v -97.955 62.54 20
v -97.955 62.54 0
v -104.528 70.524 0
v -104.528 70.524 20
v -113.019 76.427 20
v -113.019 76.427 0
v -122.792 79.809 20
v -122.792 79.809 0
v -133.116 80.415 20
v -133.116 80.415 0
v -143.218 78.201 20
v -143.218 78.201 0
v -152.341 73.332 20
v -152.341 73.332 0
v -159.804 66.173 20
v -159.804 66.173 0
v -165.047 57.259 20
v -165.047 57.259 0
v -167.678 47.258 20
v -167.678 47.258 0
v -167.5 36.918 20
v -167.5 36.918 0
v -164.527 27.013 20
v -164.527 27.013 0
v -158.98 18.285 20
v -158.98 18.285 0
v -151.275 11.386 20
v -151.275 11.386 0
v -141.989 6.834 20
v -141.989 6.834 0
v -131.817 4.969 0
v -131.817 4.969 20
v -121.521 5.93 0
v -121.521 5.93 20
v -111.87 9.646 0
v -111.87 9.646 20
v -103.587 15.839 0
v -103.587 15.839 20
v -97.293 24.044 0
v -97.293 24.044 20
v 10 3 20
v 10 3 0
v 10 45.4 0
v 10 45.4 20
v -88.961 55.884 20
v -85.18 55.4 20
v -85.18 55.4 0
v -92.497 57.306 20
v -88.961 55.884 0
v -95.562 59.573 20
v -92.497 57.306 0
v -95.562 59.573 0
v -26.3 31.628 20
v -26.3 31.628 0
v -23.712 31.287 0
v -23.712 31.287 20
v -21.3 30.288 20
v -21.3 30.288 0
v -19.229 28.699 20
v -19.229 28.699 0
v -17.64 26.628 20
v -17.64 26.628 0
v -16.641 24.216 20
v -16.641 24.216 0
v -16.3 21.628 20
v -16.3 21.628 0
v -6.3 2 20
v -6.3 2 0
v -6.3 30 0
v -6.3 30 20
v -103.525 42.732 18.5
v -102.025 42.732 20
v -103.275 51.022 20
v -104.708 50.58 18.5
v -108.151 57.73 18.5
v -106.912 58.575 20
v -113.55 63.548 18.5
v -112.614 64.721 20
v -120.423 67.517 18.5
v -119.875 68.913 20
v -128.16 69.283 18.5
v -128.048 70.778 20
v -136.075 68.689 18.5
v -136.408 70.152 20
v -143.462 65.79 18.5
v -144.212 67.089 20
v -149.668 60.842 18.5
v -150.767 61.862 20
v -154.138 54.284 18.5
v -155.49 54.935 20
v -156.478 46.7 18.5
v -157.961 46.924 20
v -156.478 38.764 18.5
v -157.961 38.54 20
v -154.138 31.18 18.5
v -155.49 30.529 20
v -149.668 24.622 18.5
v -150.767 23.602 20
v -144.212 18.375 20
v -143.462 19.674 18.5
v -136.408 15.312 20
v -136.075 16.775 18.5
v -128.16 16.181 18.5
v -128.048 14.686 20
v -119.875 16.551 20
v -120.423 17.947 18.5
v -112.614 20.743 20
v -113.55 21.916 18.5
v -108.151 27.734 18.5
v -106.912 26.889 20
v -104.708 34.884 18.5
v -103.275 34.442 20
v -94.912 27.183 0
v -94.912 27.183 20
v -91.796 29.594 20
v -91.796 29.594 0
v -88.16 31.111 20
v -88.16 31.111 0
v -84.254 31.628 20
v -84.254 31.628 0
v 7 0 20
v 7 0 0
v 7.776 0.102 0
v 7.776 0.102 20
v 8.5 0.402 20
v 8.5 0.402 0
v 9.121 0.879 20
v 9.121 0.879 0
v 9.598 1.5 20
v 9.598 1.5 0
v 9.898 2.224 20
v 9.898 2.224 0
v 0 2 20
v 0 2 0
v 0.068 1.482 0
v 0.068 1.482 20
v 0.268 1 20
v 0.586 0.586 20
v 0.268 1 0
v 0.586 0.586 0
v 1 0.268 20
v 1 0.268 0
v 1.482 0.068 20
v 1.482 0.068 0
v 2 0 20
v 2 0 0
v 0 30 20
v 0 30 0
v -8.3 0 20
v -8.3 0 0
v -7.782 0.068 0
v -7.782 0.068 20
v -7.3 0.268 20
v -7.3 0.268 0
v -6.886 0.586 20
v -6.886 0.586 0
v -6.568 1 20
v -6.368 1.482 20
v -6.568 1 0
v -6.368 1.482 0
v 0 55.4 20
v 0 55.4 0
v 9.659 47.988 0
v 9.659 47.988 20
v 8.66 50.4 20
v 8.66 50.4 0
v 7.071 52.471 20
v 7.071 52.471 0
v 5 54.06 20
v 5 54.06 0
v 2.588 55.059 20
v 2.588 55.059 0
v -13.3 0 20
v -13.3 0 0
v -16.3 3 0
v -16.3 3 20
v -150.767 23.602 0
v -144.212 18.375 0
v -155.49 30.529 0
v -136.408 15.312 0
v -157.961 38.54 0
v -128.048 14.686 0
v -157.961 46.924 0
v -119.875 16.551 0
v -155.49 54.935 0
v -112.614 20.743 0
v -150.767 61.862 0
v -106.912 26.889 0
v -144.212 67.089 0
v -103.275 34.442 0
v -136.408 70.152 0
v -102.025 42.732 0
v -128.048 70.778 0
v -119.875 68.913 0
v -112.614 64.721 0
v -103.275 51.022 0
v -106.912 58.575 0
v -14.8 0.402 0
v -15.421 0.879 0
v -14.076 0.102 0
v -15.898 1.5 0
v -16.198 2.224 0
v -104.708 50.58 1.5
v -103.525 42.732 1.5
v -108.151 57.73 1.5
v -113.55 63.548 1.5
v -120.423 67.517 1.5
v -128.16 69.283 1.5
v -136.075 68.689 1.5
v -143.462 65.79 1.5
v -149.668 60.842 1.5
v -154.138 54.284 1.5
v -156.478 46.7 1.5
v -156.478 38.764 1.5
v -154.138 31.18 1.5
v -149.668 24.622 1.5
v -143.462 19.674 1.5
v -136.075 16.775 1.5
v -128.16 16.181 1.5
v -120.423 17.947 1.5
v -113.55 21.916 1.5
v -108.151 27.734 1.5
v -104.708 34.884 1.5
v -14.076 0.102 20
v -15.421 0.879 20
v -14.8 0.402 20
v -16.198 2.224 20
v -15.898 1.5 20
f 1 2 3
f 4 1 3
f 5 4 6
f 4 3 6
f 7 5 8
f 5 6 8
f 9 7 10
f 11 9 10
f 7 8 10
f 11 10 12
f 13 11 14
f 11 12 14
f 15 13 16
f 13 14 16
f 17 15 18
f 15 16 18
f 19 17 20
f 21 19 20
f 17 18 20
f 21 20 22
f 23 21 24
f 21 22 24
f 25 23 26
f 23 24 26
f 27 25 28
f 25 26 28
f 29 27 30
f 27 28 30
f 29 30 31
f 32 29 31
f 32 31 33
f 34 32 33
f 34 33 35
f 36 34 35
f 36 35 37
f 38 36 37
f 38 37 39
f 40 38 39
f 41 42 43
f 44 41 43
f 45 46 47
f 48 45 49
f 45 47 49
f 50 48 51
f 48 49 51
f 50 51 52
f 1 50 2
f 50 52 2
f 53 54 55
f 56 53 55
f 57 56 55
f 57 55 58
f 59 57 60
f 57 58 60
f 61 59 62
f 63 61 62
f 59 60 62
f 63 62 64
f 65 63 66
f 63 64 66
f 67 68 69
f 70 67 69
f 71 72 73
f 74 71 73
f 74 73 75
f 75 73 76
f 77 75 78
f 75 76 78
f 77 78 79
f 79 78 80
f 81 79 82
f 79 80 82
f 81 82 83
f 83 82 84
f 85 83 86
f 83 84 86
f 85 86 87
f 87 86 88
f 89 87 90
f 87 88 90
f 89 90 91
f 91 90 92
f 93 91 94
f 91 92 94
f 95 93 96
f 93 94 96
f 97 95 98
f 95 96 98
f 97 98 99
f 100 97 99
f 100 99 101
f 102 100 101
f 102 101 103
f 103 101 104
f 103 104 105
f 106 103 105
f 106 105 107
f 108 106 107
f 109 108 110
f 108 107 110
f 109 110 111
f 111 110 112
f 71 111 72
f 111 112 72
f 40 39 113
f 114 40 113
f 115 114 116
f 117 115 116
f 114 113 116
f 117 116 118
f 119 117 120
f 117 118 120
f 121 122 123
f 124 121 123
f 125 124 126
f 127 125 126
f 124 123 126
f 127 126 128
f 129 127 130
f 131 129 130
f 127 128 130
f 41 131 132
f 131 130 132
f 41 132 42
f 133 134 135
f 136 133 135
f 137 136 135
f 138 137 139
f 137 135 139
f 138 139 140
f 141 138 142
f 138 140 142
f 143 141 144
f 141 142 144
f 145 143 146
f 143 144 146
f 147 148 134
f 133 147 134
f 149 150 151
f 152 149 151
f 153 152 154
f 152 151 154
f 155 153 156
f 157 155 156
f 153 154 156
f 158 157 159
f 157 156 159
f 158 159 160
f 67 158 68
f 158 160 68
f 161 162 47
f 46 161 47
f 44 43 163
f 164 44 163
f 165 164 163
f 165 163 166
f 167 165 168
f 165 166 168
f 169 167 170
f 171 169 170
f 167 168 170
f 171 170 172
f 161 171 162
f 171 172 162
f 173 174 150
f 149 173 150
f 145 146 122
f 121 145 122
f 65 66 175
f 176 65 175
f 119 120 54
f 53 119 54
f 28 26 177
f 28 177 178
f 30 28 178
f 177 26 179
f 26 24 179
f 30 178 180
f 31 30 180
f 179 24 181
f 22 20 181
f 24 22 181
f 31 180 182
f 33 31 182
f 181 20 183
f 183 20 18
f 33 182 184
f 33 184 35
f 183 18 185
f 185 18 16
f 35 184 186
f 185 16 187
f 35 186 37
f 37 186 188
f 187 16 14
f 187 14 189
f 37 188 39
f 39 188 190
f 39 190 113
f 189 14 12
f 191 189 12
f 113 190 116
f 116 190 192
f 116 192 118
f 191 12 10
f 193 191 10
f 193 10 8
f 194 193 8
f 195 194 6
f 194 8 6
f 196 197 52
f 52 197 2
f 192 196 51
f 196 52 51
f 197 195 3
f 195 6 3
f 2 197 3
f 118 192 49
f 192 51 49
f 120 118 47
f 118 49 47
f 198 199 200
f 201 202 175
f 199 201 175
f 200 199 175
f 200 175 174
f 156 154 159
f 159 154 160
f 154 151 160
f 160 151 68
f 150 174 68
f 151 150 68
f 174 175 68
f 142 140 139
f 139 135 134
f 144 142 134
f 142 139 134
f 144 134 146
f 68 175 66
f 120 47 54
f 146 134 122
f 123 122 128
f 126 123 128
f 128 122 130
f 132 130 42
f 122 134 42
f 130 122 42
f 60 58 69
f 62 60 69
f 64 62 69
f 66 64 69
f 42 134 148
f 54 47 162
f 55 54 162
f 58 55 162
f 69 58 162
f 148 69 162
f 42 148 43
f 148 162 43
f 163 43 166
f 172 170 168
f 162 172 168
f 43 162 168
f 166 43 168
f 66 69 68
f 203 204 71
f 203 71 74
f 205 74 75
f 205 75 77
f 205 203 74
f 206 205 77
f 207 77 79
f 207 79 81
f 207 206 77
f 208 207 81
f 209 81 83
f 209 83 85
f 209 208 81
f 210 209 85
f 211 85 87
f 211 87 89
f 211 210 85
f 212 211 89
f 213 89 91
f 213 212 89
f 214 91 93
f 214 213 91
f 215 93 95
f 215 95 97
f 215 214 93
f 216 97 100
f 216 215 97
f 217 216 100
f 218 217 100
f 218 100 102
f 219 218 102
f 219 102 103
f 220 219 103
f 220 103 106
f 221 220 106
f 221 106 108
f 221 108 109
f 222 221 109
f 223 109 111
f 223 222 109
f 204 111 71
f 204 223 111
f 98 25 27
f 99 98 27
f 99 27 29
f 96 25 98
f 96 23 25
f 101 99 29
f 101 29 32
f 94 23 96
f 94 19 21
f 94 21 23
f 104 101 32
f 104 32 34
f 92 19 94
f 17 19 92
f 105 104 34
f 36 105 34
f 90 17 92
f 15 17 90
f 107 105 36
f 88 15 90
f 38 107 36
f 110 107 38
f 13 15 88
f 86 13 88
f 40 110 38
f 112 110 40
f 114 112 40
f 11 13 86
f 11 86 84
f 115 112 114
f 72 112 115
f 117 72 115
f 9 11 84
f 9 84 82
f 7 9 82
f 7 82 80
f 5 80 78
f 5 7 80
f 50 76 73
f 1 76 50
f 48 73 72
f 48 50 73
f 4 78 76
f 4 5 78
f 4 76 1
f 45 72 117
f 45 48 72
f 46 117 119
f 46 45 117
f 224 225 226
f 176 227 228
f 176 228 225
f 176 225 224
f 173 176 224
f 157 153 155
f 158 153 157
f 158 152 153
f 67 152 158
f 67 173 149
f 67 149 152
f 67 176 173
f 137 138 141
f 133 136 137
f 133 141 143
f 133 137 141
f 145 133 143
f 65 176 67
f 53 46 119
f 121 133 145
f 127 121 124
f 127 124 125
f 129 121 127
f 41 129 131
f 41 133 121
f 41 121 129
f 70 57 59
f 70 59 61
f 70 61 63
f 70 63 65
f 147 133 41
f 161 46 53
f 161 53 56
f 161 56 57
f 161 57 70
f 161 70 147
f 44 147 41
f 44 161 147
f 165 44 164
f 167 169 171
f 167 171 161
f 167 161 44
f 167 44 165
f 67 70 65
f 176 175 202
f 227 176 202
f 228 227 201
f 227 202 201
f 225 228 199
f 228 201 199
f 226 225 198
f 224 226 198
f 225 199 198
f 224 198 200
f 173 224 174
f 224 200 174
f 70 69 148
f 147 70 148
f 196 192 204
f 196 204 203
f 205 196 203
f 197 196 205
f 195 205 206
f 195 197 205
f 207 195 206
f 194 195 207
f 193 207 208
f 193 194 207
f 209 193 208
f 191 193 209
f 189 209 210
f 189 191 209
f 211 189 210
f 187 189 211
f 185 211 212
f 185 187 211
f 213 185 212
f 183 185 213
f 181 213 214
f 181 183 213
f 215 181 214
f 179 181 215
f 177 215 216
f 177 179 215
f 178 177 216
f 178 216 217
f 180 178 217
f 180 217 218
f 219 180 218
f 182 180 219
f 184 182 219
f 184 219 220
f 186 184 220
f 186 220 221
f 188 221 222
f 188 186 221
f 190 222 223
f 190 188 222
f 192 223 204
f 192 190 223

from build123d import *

# Parameters (mm, degrees)
F0_R     = 26.625
F1_DEPTH = 20
F2_SIZE  = 1.5


with BuildPart() as f1:
    # F0 (on Top) → F1 (new body)
    with BuildSketch(Plane.XY):
        with BuildLine():
            ThreePointArc((0, 2), (0.585786, 0.585786), (2, 0))
            Line((2, 0), (7, 0))
            ThreePointArc((7, 0), (9.12132, 0.87868), (10, 3))
            Line((10, 3), (10, 45.4))
            ThreePointArc((10, 45.4), (7.071068, 52.471068), (0, 55.4))
            Line((0, 55.4), (-85.179761, 55.4))
            ThreePointArc((-85.179761, 55.4), (-92.497433, 57.306044), (-97.955397, 62.539776))
            ThreePointArc((-97.955397, 62.539776), (-167.944402, 42.081483), (-97.292796, 24.043935))
            ThreePointArc((-97.292796, 24.043935), (-91.796155, 29.594114), (-84.254223, 31.628032))
            Line((-84.254223, 31.628032), (-26.3, 31.628032))
            ThreePointArc((-26.3, 31.628032), (-19.228932, 28.6991), (-16.3, 21.628032))
            Line((-16.3, 21.628032), (-16.3, 3))
            ThreePointArc((-16.3, 3), (-15.42132, 0.87868), (-13.3, 0))
            Line((-13.3, 0), (-8.3, 0))
            ThreePointArc((-8.3, 0), (-6.885786, 0.585786), (-6.3, 2))
            Line((-6.3, 2), (-6.3, 30))
            Line((-6.3, 30), (0, 30))
            Line((0, 30), (0, 2))
        make_face()
        with Locations((-130.15, 42.73201)):
            Circle(F0_R, mode=Mode.SUBTRACT)
    extrude(amount=F1_DEPTH)

    # F2
    f2_edges = [f1.edges().sort_by_distance(p)[0] for p in [
        (-156.775, 42.73201, 0),
        (-156.775, 42.73201, 20),
    ]]
    chamfer(f2_edges, length=F2_SIZE)


solid = f1.part
